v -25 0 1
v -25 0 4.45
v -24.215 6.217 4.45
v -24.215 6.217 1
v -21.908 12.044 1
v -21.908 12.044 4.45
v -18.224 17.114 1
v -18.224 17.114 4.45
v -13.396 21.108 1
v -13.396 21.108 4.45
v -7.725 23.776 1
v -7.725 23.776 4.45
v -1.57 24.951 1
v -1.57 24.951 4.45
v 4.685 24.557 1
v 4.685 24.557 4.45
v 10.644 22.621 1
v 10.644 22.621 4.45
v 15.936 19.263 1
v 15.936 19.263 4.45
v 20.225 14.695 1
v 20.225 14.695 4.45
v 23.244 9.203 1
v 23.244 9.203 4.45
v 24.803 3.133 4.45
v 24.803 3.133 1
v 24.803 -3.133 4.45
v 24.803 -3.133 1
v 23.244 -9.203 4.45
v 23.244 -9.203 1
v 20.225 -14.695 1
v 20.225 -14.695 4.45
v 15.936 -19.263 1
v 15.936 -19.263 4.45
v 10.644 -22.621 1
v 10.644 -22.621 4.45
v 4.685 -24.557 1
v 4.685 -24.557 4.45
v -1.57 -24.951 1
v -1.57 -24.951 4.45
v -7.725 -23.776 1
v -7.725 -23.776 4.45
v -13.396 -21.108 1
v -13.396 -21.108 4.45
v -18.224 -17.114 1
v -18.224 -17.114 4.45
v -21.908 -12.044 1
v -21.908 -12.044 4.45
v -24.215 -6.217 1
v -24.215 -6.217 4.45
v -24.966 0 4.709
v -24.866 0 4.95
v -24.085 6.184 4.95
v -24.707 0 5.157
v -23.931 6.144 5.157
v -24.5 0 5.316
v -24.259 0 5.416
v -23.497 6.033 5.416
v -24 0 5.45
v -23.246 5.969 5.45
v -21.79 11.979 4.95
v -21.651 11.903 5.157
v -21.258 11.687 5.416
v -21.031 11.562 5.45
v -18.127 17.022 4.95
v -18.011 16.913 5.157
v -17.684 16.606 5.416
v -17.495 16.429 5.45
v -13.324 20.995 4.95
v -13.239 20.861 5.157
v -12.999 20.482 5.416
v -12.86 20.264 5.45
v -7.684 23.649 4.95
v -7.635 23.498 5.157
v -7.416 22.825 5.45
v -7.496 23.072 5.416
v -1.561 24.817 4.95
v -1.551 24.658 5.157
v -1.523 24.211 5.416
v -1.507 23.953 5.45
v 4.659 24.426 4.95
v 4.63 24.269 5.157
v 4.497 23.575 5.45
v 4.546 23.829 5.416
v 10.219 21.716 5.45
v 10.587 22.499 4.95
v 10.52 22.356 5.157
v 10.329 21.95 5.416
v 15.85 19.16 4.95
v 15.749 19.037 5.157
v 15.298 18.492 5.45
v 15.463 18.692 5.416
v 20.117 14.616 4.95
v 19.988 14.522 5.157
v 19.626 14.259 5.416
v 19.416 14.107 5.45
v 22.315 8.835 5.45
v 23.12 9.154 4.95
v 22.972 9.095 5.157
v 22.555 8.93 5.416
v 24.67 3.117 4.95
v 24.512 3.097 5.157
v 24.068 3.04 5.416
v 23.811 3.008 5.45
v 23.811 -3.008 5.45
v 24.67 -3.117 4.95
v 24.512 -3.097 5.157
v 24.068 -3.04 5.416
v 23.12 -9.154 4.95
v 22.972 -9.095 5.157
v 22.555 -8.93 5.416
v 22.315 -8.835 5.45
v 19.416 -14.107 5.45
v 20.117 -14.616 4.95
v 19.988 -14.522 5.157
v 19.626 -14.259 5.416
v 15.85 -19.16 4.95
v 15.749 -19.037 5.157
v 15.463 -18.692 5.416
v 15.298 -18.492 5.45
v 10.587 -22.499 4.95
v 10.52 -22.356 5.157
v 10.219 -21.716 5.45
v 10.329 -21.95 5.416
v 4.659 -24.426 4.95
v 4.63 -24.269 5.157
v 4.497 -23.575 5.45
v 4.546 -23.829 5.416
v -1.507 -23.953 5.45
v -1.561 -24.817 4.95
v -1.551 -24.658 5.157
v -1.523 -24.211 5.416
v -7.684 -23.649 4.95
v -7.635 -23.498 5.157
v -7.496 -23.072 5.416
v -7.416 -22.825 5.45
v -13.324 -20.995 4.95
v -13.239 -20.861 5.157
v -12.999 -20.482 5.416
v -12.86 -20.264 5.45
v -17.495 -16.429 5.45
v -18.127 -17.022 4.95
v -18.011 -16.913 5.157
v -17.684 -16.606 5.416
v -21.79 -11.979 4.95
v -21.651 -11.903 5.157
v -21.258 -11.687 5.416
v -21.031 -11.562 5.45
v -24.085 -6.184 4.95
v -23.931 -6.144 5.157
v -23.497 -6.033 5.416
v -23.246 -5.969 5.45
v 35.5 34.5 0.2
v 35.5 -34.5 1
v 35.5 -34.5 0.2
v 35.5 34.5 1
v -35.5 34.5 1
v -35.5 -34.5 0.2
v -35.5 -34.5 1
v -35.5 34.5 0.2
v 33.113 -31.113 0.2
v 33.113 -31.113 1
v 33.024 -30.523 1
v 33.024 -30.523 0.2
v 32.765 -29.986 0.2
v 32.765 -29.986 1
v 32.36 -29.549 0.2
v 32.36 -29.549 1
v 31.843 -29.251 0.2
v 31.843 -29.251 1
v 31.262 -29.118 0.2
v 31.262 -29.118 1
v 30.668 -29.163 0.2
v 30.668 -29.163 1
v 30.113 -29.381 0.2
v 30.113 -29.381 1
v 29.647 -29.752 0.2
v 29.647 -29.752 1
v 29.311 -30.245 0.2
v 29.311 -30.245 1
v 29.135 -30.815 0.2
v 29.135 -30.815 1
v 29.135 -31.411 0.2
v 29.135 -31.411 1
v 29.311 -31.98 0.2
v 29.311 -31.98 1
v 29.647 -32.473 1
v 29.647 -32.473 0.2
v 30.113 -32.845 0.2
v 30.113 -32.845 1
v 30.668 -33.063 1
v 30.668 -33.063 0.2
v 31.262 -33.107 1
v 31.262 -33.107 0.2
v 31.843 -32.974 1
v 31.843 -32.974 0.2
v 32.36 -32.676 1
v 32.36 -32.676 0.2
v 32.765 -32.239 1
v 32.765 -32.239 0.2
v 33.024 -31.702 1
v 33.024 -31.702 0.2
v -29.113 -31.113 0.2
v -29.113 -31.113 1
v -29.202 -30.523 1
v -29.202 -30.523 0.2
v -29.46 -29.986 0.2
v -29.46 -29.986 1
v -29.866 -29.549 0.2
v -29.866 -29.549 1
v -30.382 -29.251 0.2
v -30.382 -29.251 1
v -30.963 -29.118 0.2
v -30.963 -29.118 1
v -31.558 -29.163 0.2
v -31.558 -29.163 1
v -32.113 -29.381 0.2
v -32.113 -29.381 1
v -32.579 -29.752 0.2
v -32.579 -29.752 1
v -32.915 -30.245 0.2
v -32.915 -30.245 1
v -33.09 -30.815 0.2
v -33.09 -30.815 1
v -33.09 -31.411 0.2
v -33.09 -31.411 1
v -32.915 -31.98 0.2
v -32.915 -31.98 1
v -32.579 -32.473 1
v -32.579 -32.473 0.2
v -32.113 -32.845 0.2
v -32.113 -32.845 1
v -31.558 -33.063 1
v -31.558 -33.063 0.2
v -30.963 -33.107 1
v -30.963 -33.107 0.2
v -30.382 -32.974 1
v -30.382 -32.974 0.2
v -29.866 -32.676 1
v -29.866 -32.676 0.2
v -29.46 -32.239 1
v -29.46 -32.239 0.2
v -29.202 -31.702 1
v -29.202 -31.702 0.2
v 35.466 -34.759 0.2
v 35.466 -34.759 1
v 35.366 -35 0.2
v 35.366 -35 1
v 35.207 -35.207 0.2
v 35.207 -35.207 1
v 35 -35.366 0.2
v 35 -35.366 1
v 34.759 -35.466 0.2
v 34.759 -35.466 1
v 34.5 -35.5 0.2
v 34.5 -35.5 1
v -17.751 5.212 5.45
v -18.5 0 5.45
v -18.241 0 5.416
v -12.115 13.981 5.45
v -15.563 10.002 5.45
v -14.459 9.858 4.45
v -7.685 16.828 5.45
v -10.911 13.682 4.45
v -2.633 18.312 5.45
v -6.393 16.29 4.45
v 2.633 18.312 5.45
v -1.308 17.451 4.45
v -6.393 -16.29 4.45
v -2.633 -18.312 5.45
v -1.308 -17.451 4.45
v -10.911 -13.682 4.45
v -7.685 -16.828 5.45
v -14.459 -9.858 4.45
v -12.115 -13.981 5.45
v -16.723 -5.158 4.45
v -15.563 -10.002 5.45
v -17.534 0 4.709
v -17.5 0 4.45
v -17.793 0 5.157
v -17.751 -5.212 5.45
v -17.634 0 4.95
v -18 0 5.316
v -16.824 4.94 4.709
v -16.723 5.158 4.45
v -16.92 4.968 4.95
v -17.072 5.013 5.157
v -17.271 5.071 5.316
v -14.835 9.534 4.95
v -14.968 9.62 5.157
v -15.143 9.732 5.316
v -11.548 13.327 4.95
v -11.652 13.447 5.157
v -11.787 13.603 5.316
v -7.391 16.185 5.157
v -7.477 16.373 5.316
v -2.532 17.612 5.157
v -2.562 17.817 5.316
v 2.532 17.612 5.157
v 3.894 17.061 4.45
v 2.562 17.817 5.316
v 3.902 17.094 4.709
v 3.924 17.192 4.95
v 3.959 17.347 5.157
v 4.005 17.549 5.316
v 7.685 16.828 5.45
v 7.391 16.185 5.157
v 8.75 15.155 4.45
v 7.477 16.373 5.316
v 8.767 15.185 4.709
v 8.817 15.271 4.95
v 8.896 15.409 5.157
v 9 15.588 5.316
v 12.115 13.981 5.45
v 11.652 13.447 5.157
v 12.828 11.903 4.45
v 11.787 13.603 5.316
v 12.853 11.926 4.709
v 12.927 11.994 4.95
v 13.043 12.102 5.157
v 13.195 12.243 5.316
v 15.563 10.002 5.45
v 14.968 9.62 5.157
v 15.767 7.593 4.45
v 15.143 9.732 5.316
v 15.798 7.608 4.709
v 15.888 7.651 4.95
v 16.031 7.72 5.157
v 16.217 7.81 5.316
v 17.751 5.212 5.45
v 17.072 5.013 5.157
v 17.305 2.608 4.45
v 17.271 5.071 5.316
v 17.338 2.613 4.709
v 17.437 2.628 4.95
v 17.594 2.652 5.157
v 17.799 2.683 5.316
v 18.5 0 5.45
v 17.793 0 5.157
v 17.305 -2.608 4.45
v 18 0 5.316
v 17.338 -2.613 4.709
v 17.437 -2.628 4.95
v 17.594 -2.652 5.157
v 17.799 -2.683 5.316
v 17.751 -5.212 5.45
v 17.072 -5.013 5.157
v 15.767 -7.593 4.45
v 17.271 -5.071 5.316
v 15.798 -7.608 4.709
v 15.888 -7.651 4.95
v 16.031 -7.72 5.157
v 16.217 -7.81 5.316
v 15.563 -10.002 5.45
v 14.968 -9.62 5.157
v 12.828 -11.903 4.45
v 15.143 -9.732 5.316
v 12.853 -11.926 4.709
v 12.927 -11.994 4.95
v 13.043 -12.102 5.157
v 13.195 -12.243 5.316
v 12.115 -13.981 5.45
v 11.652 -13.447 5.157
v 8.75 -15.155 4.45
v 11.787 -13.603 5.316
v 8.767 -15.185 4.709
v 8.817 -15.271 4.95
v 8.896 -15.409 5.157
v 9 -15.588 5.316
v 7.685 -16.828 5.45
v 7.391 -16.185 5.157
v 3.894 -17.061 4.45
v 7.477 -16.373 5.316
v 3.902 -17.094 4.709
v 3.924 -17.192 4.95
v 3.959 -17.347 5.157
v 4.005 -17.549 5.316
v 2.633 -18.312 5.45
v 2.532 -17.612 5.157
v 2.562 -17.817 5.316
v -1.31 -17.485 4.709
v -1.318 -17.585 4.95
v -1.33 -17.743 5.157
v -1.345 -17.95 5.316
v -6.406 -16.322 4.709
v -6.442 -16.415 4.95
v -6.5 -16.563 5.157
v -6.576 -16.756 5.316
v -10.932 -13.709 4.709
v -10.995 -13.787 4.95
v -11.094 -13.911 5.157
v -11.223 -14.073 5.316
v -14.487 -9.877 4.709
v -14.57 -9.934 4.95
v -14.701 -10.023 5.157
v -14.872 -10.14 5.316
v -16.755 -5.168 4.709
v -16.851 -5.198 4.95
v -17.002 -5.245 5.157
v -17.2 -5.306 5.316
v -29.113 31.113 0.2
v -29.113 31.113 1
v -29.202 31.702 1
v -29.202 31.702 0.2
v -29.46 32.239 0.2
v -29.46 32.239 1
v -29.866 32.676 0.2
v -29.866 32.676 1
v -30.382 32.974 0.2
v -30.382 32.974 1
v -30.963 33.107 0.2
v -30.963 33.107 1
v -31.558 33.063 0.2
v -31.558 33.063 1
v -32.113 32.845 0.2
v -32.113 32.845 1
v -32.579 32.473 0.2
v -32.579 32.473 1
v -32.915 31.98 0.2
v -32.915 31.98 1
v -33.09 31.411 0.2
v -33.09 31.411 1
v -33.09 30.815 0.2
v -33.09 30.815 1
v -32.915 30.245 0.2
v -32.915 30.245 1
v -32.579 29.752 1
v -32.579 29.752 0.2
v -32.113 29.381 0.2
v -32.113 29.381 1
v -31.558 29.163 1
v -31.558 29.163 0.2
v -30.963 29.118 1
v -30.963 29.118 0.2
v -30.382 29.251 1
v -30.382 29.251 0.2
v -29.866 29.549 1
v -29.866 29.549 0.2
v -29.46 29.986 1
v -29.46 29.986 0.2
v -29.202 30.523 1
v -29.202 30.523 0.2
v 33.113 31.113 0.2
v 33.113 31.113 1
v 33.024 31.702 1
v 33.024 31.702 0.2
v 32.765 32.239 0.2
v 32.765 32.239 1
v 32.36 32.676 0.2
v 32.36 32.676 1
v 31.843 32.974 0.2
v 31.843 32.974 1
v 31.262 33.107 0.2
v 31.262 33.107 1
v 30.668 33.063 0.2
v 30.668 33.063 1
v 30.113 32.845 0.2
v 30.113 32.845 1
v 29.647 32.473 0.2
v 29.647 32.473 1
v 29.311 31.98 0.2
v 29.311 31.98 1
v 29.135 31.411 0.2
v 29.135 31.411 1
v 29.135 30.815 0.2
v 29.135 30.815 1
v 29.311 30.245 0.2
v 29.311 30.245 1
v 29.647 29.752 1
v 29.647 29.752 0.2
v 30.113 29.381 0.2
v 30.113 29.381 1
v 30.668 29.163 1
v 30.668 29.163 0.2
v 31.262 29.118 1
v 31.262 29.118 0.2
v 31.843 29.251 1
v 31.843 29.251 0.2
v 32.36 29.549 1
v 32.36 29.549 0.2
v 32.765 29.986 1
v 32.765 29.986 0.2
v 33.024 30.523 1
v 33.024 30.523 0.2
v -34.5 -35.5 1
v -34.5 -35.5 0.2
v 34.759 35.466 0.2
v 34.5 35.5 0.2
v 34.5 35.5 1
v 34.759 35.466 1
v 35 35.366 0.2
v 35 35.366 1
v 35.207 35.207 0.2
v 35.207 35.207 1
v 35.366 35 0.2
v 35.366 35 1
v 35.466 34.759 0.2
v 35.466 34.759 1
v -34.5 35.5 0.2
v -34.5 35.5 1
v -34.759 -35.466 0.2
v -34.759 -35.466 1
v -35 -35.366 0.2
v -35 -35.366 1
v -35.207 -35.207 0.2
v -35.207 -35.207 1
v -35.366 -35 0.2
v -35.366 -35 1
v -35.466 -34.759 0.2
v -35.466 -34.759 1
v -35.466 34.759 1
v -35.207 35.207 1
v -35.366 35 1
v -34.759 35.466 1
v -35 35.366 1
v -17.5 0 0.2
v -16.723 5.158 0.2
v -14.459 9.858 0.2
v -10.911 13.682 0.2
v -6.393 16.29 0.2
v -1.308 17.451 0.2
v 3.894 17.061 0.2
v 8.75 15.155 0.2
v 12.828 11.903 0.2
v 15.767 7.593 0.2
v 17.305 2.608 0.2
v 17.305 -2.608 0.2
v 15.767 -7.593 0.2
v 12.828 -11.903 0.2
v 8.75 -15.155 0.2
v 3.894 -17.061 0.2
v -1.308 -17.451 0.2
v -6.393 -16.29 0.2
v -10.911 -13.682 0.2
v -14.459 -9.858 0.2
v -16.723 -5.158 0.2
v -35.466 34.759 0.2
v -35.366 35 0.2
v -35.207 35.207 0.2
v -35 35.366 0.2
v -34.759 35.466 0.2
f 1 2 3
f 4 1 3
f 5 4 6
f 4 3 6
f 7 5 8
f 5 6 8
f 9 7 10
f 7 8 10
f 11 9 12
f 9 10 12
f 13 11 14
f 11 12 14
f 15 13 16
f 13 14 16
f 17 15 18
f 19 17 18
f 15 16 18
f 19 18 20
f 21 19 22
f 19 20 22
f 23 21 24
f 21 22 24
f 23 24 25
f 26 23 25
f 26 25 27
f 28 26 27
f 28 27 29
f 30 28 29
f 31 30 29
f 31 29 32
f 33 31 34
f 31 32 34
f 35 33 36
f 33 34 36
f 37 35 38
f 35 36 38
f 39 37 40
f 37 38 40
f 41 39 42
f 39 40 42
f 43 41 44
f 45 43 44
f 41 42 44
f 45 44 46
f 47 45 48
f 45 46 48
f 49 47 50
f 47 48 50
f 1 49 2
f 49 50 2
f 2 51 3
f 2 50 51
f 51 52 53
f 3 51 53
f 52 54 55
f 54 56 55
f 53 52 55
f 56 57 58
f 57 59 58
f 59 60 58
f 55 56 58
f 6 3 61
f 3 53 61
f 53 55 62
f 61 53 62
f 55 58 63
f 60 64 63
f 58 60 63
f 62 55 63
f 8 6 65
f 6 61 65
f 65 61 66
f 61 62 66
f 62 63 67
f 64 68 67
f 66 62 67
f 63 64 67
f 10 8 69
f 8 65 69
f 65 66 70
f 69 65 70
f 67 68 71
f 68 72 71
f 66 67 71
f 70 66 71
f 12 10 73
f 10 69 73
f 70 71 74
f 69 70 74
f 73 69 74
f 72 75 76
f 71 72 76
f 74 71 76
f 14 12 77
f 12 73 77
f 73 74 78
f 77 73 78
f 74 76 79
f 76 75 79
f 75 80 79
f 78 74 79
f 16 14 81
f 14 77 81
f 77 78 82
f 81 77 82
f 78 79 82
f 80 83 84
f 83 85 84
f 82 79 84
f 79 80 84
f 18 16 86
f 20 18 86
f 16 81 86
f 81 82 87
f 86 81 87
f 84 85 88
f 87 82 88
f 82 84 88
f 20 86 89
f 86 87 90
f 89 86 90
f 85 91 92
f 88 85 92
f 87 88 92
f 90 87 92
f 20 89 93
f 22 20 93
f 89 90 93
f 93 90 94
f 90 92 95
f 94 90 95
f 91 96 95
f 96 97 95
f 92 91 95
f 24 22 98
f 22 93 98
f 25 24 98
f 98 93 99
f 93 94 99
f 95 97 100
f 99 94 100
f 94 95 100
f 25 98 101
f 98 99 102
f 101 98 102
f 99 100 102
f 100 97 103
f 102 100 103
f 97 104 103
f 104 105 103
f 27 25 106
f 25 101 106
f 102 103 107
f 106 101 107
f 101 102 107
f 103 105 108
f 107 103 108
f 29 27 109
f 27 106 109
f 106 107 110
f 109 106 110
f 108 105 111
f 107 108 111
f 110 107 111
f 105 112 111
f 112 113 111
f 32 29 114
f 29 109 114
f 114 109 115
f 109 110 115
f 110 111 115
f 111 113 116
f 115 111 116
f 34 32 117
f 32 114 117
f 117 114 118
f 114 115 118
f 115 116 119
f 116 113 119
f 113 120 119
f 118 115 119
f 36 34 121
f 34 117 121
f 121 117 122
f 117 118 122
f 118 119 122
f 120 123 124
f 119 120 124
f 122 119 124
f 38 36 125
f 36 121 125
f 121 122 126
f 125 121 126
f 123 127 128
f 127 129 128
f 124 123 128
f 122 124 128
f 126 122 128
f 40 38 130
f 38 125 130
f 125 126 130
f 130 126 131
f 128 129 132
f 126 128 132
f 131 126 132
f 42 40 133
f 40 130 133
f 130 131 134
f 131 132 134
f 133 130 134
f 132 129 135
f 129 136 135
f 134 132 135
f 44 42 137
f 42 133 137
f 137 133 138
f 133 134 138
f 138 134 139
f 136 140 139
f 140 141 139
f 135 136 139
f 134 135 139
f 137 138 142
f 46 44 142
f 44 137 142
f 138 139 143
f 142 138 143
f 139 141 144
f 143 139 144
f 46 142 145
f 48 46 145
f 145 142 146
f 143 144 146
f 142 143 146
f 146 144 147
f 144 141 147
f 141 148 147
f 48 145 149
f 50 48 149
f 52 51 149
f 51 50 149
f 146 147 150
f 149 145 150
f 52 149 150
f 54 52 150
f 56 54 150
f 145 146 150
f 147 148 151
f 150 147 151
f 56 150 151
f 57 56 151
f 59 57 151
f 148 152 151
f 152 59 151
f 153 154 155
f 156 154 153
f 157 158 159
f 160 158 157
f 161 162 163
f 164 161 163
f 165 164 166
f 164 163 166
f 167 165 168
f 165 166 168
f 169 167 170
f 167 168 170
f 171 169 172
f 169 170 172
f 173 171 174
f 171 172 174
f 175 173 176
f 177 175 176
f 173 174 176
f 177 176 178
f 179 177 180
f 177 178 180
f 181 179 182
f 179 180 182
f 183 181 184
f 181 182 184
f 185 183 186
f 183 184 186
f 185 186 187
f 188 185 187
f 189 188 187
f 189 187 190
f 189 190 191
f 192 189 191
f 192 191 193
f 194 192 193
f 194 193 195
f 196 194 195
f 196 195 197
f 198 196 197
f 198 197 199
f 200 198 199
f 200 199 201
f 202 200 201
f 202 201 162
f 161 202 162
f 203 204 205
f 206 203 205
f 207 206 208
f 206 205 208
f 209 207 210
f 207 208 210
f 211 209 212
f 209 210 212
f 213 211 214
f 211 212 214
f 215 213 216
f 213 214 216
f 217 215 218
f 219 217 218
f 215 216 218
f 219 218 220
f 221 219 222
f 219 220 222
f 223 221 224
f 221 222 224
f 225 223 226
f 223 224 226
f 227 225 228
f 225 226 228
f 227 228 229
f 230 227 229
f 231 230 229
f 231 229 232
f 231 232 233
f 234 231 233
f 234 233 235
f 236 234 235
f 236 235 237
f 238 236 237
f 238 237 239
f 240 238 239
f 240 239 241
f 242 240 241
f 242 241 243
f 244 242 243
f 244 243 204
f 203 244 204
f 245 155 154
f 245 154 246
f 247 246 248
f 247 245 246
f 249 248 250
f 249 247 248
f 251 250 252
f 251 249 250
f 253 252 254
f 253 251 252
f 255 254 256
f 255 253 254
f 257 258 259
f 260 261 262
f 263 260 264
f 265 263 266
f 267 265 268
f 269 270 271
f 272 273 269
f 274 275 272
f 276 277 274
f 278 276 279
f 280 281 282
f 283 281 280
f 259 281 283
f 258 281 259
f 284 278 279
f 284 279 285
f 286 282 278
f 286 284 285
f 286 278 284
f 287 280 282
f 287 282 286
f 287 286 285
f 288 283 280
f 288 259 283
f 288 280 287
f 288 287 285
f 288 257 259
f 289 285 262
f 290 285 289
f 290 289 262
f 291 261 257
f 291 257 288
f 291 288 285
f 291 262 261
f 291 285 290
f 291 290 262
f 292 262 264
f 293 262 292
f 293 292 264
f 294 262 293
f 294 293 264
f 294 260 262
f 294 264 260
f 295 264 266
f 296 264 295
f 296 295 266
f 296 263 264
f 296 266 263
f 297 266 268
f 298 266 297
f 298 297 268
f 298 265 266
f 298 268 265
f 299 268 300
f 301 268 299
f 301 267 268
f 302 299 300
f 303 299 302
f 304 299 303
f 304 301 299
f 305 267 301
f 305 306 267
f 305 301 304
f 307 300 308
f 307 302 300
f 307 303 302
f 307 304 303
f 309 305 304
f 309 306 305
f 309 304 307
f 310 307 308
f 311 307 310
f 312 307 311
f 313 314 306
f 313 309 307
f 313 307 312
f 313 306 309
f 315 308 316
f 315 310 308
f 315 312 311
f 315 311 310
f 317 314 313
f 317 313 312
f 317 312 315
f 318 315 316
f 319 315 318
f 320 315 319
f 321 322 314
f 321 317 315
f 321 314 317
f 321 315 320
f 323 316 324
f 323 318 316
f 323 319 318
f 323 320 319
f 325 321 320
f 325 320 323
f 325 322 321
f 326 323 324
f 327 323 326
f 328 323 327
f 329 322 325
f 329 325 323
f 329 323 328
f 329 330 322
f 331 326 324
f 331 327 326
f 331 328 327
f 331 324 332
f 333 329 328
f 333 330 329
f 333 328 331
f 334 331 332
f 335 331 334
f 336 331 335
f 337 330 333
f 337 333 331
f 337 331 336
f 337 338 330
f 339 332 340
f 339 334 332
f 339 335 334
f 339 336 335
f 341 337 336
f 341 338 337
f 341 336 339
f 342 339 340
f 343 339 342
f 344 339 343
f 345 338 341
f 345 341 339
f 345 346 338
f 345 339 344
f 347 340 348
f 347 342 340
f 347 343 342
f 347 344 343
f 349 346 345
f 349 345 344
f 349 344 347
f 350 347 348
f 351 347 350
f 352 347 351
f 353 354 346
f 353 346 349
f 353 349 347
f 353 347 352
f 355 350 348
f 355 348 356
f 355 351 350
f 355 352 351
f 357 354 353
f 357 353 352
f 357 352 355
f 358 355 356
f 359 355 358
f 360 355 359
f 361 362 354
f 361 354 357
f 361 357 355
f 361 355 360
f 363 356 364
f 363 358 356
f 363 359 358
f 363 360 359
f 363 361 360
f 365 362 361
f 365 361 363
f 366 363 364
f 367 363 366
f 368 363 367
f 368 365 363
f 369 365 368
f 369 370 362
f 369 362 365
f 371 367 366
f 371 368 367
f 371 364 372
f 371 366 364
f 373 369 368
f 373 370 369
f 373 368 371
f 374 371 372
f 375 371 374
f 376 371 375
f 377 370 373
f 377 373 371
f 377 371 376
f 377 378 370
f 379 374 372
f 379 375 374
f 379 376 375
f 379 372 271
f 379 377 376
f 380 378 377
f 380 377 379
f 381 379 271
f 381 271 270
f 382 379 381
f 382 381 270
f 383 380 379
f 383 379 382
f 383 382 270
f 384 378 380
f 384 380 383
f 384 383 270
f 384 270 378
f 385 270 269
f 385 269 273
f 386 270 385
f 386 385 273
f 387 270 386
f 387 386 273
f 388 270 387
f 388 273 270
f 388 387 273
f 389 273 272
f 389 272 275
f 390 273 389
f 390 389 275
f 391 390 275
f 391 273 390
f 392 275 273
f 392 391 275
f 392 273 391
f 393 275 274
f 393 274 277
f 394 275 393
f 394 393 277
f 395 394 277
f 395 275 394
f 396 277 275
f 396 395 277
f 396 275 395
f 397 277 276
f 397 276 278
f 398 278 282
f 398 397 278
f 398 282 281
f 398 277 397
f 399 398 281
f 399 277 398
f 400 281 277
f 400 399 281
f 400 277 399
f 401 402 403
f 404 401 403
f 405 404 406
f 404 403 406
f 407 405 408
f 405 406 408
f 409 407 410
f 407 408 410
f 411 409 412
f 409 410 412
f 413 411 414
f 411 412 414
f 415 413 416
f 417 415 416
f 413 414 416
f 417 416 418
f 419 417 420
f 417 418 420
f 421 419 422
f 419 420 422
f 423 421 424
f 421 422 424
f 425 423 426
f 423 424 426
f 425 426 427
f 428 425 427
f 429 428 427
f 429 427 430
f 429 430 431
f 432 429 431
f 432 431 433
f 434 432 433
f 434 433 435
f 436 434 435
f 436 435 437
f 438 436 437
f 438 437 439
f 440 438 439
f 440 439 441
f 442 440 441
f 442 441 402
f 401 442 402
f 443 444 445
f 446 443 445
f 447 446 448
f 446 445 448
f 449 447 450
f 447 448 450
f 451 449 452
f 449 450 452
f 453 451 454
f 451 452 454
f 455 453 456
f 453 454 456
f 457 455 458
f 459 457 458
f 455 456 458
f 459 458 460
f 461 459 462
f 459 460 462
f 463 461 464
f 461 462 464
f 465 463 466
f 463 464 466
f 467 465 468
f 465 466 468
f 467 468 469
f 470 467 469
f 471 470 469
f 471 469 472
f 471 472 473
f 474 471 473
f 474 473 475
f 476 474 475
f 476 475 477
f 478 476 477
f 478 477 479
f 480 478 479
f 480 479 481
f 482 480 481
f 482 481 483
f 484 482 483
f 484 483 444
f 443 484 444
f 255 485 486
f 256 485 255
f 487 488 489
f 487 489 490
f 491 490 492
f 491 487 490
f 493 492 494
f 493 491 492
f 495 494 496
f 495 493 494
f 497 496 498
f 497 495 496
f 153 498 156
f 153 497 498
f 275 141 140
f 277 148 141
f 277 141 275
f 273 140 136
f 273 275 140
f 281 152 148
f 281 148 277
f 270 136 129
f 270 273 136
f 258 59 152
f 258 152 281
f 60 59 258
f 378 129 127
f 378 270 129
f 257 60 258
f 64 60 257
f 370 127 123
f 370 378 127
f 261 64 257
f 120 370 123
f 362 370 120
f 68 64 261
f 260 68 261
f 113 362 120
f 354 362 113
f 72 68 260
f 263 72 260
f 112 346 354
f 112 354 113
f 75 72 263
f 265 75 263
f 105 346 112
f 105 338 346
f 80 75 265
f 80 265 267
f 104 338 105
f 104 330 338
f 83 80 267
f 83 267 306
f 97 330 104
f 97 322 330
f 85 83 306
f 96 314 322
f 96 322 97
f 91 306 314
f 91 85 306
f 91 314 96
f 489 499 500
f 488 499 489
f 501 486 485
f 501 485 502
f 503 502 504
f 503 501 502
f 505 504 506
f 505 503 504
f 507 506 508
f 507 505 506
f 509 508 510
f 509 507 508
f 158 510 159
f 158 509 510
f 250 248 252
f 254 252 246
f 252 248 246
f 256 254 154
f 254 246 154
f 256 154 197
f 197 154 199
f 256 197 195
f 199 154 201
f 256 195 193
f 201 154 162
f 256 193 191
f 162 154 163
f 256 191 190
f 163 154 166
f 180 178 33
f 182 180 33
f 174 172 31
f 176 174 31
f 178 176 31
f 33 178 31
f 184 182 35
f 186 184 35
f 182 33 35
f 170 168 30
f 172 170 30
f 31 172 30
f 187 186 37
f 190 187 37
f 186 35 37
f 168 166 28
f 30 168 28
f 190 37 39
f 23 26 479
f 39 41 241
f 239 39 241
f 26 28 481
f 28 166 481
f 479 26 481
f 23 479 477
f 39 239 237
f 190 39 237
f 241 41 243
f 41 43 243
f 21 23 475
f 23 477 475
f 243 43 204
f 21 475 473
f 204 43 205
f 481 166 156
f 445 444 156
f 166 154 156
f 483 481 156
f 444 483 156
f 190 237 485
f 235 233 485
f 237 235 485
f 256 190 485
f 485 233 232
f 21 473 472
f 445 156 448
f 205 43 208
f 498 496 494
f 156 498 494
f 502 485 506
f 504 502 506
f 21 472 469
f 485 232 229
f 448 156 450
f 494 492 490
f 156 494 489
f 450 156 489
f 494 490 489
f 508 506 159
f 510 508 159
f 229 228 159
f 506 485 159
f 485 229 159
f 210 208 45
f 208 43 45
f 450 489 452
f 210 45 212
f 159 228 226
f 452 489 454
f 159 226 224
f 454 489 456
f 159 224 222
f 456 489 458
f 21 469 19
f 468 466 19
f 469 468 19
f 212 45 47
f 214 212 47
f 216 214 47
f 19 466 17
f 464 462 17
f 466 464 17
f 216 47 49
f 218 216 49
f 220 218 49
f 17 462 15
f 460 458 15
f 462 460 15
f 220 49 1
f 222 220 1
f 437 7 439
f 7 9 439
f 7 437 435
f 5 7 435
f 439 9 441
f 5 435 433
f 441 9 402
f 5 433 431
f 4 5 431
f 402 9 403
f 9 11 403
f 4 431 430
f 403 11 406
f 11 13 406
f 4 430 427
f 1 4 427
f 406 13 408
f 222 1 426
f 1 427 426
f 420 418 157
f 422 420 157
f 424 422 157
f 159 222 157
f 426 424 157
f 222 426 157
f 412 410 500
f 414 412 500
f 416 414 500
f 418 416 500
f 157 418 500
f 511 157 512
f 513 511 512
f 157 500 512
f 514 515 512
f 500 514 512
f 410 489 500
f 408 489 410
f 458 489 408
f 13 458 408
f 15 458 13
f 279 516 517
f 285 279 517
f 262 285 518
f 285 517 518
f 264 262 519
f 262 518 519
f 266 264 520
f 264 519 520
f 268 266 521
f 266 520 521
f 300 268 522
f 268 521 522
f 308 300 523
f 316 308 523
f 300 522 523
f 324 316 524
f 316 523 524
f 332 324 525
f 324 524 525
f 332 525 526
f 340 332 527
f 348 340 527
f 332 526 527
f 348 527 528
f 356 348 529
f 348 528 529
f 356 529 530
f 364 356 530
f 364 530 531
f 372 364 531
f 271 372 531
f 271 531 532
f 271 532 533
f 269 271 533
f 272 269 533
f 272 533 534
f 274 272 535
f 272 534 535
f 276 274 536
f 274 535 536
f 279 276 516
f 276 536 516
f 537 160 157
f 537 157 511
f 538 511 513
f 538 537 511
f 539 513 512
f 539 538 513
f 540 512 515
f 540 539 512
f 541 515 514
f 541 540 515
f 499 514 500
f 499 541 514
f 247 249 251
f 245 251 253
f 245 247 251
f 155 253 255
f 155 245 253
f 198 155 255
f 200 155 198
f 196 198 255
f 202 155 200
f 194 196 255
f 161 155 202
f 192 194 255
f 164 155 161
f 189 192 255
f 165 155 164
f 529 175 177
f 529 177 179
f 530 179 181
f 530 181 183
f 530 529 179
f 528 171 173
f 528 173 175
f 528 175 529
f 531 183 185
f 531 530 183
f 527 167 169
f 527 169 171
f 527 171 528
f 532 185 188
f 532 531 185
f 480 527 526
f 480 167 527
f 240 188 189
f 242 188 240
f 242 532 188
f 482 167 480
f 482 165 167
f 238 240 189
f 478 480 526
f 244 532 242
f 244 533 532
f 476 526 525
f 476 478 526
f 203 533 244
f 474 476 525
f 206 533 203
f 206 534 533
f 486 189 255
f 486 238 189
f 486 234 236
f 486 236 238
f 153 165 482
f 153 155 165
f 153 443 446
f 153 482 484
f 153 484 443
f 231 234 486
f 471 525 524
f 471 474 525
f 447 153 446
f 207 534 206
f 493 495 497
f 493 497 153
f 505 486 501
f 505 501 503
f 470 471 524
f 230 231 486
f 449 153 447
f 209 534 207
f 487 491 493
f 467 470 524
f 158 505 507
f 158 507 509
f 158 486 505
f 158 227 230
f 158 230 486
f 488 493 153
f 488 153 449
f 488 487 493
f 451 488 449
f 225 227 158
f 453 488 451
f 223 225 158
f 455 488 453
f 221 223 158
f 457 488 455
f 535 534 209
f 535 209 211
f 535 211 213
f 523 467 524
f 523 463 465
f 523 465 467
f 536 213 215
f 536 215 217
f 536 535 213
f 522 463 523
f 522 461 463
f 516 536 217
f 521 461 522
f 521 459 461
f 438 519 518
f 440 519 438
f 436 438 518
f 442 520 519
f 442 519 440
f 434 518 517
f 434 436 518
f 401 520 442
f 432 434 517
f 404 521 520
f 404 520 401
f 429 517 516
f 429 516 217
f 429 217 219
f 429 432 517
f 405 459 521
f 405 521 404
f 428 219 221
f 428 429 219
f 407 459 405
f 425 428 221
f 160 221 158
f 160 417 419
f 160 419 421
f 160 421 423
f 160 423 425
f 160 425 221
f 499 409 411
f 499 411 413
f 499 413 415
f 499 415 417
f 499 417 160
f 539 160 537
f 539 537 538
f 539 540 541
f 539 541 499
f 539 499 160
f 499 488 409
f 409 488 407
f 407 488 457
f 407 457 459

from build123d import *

# Parameters (mm, degrees)
SKETCH_1_W            = 71
SKETCH_1_H            = 71
EXTRUDE_1_DEPTH       = 0.8
SKETCH_2_W            = 25
SKETCH_2_H            = 4.45
HOLE_WIZARD_M30_1_D   = 35
HOLE_WIZARD_4_0_4_1_D = 4
FILLET_1_R            = 1
FILLET_2_R            = 10
EXTRUDE_START         = -0.8
SKETCH_9_R            = 17.5
EXTRUDE_3_DEPTH       = 0.8
CUT_EXTRUDE_1_REACH   = 52.401
SKETCH_8_R            = 2


with BuildPart() as part:
    # 草图1 → 凸台-拉伸1 (new body)
    with BuildSketch(Plane.XY.offset(1)):
        Rectangle(SKETCH_1_W, SKETCH_1_H)
    extrude(amount=-EXTRUDE_1_DEPTH)

    # 草图2 → 旋转1 (revolve)
    with BuildSketch(Plane.XZ, mode=Mode.PRIVATE) as revolve_1_sk:
        with Locations((12.5, 3.225)):
            Rectangle(SKETCH_2_W, SKETCH_2_H)
    revolve(revolve_1_sk.sketch.rotate(Axis((0, 0, 5.45), (0, 0, -1)), 180), axis=Axis((0, 0, 5.45), (0, 0, -1)))

    # M30 间隙孔1 (through all)
    with Locations(Plane.XY.offset(5.45)):
        with Locations((0, 0)):
            Hole(HOLE_WIZARD_M30_1_D / 2)

    # Ø4.0 (4) 直径孔1 (through all)
    with Locations(Plane.XY.offset(1)):
        with Locations((-29, 29), (-29, -29), (29, -29), (29, 29)):
            Hole(HOLE_WIZARD_4_0_4_1_D / 2)

    # 圆角1
    fillet_1_edges = [part.edges().sort_by_distance(p)[0] for p in [
        (25, 0, 5.45),
        (17.5, 0, 5.45),
    ]]
    fillet(fillet_1_edges, radius=FILLET_1_R)

    # 圆角2
    fillet_2_edges = [part.edges().sort_by_distance(p)[0] for p in [
        (35.5, 35.5, 0.6),
        (35.5, -35.5, 0.6),
        (-35.5, -35.5, 0.6),
        (-35.5, 35.5, 0.6),
    ]]
    fillet(fillet_2_edges, radius=FILLET_2_R)

    # 草图9 → 凸台-拉伸3 (add)
    with BuildSketch(Plane.XY.offset(1).offset(EXTRUDE_START)):
        with BuildLine():
            Line((-34.5, 35.5), (34.5, 35.5))
            ThreePointArc((34.5, 35.5), (35.207106781, 35.207106781), (35.5, 34.5))
            Line((35.5, 34.5), (35.5, -34.5))
            ThreePointArc((35.5, -34.5), (35.207106781, -35.207106781), (34.5, -35.5))
            Line((34.5, -35.5), (-34.5, -35.5))
            ThreePointArc((-34.5, -35.5), (-35.207106781, -35.207106781), (-35.5, -34.5))
            Line((-35.5, -34.5), (-35.5, 34.5))
            ThreePointArc((-35.5, 34.5), (-35.207106781, 35.207106781), (-34.5, 35.5))
        make_face()
        Circle(SKETCH_9_R, mode=Mode.SUBTRACT)
    extrude(amount=EXTRUDE_3_DEPTH)

    # 草图8 → 切除-拉伸1 (cut, up to next)
    with BuildSketch(Plane.XY.offset(1), mode=Mode.PRIVATE) as cut_extrude_1_sk1:
        with Locations((-31.112698372, 31.112698372)):
            Circle(SKETCH_8_R)
    cut_extrude_1_tool1 = extrude(cut_extrude_1_sk1.sketch, amount=-CUT_EXTRUDE_1_REACH, mode=Mode.PRIVATE) & part.part
    # 草图8 → 切除-拉伸1 (cut, up to next)
    with BuildSketch(Plane.XY.offset(1), mode=Mode.PRIVATE) as cut_extrude_1_sk2:
        with Locations((31.112698372, -31.112698372)):
            Circle(SKETCH_8_R)
    cut_extrude_1_tool2 = extrude(cut_extrude_1_sk2.sketch, amount=-CUT_EXTRUDE_1_REACH, mode=Mode.PRIVATE) & part.part
    # 草图8 → 切除-拉伸1 (cut, up to next)
    with BuildSketch(Plane.XY.offset(1), mode=Mode.PRIVATE) as cut_extrude_1_sk3:
        with Locations((-31.112698372, -31.112698372)):
            Circle(SKETCH_8_R)
    cut_extrude_1_tool3 = extrude(cut_extrude_1_sk3.sketch, amount=-CUT_EXTRUDE_1_REACH, mode=Mode.PRIVATE) & part.part
    # 草图8 → 切除-拉伸1 (cut, up to next)
    with BuildSketch(Plane.XY.offset(1), mode=Mode.PRIVATE) as cut_extrude_1_sk4:
        with Locations((31.112698372, 31.112698372)):
            Circle(SKETCH_8_R)
    cut_extrude_1_tool4 = extrude(cut_extrude_1_sk4.sketch, amount=-CUT_EXTRUDE_1_REACH, mode=Mode.PRIVATE) & part.part
    add(cut_extrude_1_tool1.solids().sort_by_distance((-31.112698, 31.112698, 1))[0], mode=Mode.SUBTRACT)
    add(cut_extrude_1_tool2.solids().sort_by_distance((31.112698, -31.112698, 1))[0], mode=Mode.SUBTRACT)
    add(cut_extrude_1_tool3.solids().sort_by_distance((-31.112698, -31.112698, 1))[0], mode=Mode.SUBTRACT)
    add(cut_extrude_1_tool4.solids().sort_by_distance((31.112698, 31.112698, 1))[0], mode=Mode.SUBTRACT)


solid = part.part
